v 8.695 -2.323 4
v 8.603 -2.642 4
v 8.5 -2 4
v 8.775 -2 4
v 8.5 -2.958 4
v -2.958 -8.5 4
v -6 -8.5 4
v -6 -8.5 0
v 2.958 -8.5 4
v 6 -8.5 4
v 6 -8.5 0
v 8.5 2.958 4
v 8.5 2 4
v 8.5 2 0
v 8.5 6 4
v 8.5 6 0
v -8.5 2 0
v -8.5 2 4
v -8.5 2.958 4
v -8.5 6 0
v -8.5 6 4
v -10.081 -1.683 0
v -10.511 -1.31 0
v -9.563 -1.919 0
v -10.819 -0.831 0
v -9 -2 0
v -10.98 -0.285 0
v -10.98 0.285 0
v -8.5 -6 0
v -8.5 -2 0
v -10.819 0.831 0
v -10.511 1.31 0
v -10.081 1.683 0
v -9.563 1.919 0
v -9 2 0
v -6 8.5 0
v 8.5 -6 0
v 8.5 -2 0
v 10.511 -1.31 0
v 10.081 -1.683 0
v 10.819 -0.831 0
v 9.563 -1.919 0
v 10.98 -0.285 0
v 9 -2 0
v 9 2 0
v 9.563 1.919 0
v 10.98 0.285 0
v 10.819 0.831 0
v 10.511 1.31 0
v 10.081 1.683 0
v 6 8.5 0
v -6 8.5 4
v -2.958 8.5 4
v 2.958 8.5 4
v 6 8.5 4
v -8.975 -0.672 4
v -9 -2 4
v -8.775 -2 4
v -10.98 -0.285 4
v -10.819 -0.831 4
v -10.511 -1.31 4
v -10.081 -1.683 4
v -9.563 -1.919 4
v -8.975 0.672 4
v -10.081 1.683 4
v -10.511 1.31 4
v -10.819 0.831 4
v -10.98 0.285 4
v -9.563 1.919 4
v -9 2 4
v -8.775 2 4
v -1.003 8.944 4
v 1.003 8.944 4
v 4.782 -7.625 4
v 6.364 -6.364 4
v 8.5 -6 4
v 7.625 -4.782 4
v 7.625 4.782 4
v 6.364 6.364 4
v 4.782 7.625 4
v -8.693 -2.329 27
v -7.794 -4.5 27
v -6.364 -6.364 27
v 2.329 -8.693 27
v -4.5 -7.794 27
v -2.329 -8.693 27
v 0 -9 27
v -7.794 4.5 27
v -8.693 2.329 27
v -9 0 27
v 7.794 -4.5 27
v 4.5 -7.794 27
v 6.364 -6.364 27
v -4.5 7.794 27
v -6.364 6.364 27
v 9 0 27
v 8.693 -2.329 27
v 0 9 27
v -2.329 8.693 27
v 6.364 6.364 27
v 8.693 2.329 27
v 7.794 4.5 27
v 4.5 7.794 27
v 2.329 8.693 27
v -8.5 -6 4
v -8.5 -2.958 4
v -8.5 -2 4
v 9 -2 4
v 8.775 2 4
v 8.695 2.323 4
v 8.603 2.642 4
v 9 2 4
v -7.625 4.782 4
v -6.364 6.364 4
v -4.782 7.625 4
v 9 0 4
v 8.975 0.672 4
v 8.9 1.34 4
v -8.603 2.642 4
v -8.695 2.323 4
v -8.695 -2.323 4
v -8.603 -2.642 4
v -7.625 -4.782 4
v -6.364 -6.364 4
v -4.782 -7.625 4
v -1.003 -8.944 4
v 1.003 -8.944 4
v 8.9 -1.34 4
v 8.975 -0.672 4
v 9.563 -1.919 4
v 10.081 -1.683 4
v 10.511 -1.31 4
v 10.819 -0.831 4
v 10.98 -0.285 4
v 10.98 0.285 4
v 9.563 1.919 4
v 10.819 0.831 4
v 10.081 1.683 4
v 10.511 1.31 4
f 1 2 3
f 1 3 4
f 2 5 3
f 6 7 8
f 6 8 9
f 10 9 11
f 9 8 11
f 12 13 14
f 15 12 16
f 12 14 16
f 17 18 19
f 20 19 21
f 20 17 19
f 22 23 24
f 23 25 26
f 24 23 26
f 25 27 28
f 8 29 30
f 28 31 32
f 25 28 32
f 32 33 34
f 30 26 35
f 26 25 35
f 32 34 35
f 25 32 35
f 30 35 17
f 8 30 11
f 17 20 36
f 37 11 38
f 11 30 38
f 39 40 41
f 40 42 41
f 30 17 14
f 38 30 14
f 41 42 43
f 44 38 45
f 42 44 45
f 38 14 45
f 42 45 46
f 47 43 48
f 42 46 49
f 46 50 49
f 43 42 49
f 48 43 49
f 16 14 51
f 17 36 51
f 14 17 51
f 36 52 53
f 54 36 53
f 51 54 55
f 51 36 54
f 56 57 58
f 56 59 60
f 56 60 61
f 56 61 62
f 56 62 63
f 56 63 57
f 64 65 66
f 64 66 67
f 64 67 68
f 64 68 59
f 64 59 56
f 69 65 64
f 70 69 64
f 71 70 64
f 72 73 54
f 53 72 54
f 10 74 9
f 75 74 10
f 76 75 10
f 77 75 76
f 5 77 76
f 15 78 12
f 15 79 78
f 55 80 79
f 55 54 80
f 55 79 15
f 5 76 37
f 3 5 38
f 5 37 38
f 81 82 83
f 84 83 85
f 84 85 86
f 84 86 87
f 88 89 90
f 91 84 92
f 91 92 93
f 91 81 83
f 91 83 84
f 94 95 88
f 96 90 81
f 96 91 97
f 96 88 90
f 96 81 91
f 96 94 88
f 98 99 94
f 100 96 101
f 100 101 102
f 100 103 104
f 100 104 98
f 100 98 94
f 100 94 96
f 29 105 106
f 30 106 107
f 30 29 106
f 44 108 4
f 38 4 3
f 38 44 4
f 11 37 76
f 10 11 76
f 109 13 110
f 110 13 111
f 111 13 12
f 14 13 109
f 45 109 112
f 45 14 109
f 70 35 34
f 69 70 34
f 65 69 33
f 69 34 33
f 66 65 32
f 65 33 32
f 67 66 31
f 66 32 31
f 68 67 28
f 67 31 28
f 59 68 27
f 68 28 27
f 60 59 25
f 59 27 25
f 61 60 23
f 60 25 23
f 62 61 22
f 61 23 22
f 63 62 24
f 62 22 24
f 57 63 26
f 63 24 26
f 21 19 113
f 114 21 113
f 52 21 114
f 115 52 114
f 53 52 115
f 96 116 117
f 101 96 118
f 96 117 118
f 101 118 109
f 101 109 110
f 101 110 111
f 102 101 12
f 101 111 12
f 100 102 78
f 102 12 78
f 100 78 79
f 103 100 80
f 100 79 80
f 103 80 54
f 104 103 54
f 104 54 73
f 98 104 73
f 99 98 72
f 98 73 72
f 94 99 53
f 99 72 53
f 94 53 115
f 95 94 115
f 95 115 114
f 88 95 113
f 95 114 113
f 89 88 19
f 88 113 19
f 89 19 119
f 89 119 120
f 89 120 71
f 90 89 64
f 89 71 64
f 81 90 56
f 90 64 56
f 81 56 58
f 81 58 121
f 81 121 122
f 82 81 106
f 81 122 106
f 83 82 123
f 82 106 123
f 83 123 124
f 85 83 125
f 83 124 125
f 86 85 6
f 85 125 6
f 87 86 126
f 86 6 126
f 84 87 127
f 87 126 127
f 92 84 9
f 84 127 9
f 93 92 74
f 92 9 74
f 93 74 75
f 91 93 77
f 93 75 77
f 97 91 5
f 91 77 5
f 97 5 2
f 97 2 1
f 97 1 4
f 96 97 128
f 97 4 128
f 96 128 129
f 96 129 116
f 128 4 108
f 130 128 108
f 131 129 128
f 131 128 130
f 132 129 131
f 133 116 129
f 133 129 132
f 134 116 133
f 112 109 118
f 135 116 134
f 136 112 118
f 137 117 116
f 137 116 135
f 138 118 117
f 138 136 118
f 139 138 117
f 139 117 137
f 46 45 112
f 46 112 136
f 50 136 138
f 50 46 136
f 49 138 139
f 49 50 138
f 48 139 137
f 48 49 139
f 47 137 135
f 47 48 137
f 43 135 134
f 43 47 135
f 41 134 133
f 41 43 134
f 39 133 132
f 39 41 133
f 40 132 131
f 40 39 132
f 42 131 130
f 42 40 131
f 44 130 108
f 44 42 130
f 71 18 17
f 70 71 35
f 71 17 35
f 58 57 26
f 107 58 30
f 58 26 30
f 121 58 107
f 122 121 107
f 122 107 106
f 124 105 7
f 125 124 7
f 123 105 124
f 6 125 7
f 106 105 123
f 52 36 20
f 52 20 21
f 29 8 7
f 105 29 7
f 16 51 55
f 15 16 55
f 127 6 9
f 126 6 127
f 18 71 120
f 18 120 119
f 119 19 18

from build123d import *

# Parameters (mm, degrees)
SKETCH1_W           = 17
SKETCH1_H           = 17
BOSS_EXTRUDE1_DEPTH = 4
CHAMFER1_SIZE       = 2.5
BOSS_EXTRUDE3_DEPTH = 4
SKETCH2_R           = 9
BOSS_EXTRUDE2_DEPTH = 23


with BuildPart() as part:
    # Sketch1 → Boss-Extrude1 (new body)
    with BuildSketch(Plane.XY):
        Rectangle(SKETCH1_W, SKETCH1_H)
    extrude(amount=BOSS_EXTRUDE1_DEPTH)

    # Chamfer1
    chamfer1_edges = [part.edges().sort_by_distance(p)[0] for p in [
        (8.5, -8.5, 2),
        (-8.5, -8.5, 2),
        (-8.5, 8.5, 2),
        (8.5, 8.5, 2),
    ]]
    chamfer(chamfer1_edges, length=CHAMFER1_SIZE)

    # Sketch3 → Boss-Extrude3 (add)
    with BuildSketch(Plane.XY):
        with BuildLine():
            Line((-8.5, 2), (-9, 2))
            ThreePointArc((-9, 2), (-11, 0), (-9, -2))
            Line((-9, -2), (-8.5, -2))
            Line((-8.5, -2), (-8.5, 2))
        make_face()
    boss_extrude3 = extrude(amount=BOSS_EXTRUDE3_DEPTH)

    # Mirror1: Boss-Extrude3 across plane
    add(boss_extrude3.mirror(Plane(origin=(0, 0, 0), x_dir=(0, 0, 1), z_dir=(1, 0, 0))))

    # Sketch2 → Boss-Extrude2 (add)
    with BuildSketch(Plane.XY.offset(4)):
        Circle(SKETCH2_R)
    extrude(amount=BOSS_EXTRUDE2_DEPTH)


solid = part.part
